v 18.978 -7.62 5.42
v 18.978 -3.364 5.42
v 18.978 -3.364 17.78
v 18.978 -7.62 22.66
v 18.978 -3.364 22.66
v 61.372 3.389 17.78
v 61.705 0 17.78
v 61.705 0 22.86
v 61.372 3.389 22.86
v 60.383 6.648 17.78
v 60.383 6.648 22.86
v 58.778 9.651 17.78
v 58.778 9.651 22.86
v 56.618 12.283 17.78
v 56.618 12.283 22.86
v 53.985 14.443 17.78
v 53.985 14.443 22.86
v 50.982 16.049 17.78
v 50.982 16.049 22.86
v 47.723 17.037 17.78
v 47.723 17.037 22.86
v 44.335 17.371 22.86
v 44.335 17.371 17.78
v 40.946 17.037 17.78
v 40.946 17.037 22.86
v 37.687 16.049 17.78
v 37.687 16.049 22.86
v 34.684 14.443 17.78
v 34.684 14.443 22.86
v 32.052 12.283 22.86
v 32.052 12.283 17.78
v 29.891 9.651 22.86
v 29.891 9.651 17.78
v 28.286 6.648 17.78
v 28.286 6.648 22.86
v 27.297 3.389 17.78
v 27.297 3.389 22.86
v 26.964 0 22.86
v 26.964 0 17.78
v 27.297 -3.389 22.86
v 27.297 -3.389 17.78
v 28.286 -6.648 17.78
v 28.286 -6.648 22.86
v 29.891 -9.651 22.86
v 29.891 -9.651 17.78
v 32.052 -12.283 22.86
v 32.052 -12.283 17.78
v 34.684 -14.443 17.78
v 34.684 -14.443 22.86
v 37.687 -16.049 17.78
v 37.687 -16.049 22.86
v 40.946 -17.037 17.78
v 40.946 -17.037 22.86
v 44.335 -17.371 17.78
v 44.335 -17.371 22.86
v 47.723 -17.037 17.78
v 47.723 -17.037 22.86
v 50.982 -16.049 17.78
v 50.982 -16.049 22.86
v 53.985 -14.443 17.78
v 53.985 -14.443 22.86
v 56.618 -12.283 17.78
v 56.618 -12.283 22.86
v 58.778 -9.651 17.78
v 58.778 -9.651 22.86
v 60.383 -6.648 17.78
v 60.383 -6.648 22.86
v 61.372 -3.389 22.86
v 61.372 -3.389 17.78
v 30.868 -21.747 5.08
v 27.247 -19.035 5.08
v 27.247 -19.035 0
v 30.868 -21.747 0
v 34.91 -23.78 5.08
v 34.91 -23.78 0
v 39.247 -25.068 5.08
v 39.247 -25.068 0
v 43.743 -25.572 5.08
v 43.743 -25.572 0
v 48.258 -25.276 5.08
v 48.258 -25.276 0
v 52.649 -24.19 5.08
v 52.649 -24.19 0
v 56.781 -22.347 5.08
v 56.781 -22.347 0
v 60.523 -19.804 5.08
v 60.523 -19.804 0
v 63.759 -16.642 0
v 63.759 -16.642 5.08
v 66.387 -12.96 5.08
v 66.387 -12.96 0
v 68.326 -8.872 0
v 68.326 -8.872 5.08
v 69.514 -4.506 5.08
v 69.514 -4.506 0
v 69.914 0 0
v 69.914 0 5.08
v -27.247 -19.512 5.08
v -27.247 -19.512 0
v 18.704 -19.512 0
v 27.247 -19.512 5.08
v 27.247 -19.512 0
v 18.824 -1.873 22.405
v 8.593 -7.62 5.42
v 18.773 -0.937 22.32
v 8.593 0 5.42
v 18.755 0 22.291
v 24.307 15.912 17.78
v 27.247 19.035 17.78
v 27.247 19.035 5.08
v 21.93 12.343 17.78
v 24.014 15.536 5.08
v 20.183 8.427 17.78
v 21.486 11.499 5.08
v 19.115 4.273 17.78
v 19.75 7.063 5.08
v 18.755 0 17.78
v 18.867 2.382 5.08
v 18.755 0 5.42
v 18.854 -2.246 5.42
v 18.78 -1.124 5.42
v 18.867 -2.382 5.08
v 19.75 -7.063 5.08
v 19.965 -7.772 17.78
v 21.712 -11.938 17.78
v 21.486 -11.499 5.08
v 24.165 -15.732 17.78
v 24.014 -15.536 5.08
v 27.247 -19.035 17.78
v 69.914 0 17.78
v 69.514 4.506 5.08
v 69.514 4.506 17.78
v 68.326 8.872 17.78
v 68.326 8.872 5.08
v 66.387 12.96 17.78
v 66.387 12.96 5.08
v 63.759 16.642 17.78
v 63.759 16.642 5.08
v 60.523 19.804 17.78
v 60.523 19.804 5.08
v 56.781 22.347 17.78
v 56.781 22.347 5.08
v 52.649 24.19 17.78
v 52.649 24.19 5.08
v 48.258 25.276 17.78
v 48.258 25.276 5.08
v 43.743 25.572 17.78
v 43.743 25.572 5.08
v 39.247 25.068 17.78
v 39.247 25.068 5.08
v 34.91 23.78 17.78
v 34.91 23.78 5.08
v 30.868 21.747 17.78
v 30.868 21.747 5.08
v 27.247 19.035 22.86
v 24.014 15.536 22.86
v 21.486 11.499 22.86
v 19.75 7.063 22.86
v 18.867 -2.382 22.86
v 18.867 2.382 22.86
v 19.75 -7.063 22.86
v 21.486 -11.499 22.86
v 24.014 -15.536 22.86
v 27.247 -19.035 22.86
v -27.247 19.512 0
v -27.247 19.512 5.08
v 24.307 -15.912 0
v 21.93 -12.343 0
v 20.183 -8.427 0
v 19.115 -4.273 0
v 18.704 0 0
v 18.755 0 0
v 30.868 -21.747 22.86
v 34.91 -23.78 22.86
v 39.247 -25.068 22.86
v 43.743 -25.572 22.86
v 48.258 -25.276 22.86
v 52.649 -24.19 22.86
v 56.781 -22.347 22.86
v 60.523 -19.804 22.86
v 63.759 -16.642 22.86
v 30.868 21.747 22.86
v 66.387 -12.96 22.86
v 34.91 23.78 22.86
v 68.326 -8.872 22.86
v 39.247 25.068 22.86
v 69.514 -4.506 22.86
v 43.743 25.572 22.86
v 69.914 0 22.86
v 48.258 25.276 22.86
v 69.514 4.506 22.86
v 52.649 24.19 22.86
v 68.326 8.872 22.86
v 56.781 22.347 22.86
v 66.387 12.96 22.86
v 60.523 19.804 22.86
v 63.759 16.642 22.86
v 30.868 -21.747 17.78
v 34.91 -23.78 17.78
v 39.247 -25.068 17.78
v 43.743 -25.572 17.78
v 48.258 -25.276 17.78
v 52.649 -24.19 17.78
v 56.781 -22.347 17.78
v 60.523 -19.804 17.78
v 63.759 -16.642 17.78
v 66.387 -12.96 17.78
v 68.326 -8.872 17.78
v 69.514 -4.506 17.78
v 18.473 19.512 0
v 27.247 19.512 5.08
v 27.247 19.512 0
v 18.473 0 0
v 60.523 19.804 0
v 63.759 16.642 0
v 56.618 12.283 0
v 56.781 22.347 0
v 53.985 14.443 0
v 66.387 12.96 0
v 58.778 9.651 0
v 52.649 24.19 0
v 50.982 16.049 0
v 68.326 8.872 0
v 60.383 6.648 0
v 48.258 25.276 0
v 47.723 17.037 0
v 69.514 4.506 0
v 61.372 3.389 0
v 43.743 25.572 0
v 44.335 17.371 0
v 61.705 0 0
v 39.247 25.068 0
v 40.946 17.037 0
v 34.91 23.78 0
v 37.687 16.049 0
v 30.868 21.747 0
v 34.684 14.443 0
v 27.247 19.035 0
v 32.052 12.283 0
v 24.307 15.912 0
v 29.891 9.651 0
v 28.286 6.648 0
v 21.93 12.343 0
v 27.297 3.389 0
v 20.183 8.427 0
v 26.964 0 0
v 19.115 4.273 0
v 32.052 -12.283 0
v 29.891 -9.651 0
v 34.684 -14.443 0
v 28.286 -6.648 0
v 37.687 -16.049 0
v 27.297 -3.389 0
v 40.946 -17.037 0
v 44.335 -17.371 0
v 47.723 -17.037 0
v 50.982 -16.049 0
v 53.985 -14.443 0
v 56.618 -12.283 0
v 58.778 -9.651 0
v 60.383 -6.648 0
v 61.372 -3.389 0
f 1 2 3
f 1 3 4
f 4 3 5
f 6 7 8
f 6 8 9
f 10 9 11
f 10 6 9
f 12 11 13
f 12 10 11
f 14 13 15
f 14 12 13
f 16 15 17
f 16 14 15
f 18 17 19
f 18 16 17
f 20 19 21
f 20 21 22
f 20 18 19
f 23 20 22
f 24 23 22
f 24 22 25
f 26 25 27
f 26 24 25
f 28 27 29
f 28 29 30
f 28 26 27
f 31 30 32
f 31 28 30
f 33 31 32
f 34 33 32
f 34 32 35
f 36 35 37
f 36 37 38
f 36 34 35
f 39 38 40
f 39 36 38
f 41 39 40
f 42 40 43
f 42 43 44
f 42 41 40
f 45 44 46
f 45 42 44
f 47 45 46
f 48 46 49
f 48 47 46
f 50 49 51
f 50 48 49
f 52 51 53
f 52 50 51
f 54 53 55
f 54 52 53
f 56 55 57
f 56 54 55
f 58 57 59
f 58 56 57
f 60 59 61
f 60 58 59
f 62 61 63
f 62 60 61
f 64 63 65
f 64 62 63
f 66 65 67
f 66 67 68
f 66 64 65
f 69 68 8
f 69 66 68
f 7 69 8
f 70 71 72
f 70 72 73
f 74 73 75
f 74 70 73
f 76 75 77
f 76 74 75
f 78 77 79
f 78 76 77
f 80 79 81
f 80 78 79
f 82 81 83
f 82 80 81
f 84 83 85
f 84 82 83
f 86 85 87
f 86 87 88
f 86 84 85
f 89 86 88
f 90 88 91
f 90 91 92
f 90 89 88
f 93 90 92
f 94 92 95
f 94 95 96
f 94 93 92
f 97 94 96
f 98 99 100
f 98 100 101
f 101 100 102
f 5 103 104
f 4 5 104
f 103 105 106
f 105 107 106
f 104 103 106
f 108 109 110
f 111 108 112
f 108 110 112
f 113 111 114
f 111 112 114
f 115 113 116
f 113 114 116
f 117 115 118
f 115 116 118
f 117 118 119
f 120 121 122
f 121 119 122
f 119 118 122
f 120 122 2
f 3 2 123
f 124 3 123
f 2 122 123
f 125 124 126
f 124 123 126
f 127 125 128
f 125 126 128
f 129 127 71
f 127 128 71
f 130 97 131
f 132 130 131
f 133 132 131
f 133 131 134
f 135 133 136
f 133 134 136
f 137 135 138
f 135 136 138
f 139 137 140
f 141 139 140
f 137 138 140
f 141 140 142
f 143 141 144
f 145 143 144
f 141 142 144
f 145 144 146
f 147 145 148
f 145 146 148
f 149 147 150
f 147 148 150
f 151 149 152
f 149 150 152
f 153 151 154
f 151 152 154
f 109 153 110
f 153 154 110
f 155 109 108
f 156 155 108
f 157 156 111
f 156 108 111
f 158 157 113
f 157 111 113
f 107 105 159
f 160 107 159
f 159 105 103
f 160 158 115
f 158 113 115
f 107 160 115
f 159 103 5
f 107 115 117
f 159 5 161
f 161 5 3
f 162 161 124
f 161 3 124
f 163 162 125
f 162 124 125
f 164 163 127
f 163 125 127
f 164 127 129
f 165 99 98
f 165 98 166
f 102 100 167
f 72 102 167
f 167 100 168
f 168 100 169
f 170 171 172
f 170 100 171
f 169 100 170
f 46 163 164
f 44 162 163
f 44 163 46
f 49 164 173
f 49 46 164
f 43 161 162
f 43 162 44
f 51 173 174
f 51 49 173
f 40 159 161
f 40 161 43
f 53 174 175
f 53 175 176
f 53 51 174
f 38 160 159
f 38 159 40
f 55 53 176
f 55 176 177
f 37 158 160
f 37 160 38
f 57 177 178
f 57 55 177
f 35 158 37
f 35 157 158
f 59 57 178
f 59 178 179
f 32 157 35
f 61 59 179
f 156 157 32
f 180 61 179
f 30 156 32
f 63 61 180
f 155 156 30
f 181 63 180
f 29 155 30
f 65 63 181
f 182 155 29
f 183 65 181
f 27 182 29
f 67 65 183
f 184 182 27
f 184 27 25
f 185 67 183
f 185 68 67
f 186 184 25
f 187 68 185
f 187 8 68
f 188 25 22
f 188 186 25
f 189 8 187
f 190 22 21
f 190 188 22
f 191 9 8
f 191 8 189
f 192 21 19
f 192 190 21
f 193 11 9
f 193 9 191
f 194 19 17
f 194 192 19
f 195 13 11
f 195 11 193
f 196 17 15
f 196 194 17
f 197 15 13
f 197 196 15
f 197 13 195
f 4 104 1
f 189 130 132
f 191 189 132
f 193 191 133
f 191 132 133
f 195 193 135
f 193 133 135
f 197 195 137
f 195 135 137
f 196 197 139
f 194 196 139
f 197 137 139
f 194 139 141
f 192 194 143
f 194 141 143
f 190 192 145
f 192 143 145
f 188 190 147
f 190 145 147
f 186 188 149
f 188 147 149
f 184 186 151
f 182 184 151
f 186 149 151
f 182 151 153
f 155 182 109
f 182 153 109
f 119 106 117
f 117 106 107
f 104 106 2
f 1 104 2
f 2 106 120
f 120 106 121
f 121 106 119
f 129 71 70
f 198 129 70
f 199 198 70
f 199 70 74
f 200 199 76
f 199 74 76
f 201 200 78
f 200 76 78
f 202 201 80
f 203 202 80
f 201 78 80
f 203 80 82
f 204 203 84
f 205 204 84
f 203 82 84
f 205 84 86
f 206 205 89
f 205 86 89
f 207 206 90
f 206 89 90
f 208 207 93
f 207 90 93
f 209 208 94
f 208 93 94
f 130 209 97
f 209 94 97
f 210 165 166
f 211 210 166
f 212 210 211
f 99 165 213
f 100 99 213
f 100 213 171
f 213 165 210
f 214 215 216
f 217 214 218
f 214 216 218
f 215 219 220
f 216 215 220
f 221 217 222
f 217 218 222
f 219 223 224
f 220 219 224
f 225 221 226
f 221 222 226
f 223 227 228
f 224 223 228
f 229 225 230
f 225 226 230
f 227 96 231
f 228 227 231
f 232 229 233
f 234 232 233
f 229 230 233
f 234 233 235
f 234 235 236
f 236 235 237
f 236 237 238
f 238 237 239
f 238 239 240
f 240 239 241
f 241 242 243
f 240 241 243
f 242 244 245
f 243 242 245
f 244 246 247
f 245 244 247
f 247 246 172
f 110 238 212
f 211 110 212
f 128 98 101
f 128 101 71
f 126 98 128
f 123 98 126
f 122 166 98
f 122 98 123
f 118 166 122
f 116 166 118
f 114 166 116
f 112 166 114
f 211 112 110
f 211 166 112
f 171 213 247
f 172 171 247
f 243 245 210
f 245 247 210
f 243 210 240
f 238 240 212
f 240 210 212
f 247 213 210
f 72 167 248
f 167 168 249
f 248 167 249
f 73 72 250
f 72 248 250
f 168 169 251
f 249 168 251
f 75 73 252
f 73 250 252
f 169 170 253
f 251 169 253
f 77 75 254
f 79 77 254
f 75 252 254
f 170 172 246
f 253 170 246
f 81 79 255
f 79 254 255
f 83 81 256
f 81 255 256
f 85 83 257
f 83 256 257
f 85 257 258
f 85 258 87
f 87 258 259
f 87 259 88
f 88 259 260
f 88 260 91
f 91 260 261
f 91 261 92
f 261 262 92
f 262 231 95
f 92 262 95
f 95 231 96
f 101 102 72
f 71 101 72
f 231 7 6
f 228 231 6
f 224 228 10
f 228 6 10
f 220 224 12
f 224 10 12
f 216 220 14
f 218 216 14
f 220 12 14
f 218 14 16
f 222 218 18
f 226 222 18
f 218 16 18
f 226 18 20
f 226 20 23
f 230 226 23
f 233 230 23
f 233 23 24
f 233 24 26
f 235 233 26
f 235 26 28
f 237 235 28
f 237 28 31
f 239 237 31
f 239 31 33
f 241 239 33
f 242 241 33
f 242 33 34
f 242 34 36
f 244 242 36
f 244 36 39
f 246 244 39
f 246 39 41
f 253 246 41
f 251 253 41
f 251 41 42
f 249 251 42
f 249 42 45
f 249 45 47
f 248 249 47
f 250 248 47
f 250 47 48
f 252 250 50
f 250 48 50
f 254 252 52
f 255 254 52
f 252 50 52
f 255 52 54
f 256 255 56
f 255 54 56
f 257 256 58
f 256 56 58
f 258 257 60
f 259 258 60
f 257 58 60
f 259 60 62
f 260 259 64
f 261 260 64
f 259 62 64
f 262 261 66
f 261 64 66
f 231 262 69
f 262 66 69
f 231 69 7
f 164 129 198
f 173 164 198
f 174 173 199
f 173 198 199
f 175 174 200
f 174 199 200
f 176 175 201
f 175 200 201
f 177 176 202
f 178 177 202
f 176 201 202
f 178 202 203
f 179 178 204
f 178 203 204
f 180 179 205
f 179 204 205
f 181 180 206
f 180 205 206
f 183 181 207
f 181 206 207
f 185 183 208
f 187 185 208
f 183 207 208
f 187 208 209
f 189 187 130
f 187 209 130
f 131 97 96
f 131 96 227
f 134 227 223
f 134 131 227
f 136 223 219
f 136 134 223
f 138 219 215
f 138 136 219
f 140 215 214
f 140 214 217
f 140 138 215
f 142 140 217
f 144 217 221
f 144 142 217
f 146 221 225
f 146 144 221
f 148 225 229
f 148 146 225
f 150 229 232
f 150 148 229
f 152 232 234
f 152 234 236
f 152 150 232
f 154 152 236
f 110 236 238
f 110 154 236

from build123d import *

# Parameters (mm, degrees)
F0_W      = 54.494548589
F0_H      = 39.0236377716
F1_DEPTH  = 5.08
F3_DEPTH  = 12.7
F4_W      = 28.1709115952
F4_H      = 15.8172734082
F4_W_2    = 23.5527232289
F5_DEPTH  = 25.5801105544
F6_W      = 57.7272698283
F6_H      = 25.6309099495
F7_DEPTH  = 25.5801105544
F8_R      = 17.3708251463
F9_DEPTH  = 17.781
F10_DEPTH = 5.08
F12_DEPTH = 7.62


with BuildPart() as f1:
    # F0 (on Top) → F1 (new body)
    with BuildSketch(Plane.XY):
        Rectangle(F0_W, F0_H)
    extrude(amount=F1_DEPTH)

    # F2 (on face) → F3 (join, symmetric)
    with BuildSketch(Plane.XY.offset(5.08)):
        with BuildLine():
            Line((27.2472742945, -19.0345980856), (27.2472742945, 19.0345980856))
            ThreePointArc((27.2472742945, 19.0345980856), (18.7554389024, 0), (27.2472742945, -19.0345980856))
        make_face()
        with BuildLine():
            ThreePointArc((27.2472742945, -19.0345980856), (54.7560079993, -23.3598822472), (69.9136600113, 0))
            ThreePointArc((69.9136600113, 0), (54.7560079993, 23.3598822472), (27.2472742945, 19.0345980856))
            Line((27.2472742945, 19.0345980856), (27.2472742945, -19.0345980856))
        make_face()
    extrude(amount=F3_DEPTH, both=True)

    # F4 (on Front) → F5 (cut, through all)
    with BuildSketch(Plane.XZ):
        with Locations((32.5581813231, -7.9086367041)):
            Rectangle(F4_W, F4_H)
        with Locations((58.4199987352, -7.9086367041)):
            Rectangle(F4_W_2, F4_H)
    extrude(amount=-F5_DEPTH, mode=Mode.SUBTRACT)

    # F6 (on Front) → F7 (cut, through all)
    with BuildSketch(Plane.XZ):
        with Locations((47.5672706962, -12.8154549748)):
            Rectangle(F6_W, F6_H)
    extrude(amount=F7_DEPTH, mode=Mode.SUBTRACT)

    # F8 (on face) → F9 (cut, through all)
    with BuildSketch(Plane.XY.offset(17.78)):
        with Locations((44.3345494568, 0)):
            Circle(F8_R)
    extrude(amount=-F9_DEPTH, mode=Mode.SUBTRACT)

    # F10 (add): a face of the model
    f10_faces = [f1.faces().sort_by_distance(p)[0] for p in [
        (60.9385234936, 18.4962183503, 17.78),
    ]]
    extrude(f10_faces, amount=F10_DEPTH)

    # F11 (on Front) → F12 (join)
    with BuildSketch(Plane.XZ):
        Polygon((18.9776308835, 5.4199039005), (18.9776308835, 22.6603336632), (8.5929688066, 5.4199039005), align=None)
    extrude(amount=F12_DEPTH)


solid = f1.part
